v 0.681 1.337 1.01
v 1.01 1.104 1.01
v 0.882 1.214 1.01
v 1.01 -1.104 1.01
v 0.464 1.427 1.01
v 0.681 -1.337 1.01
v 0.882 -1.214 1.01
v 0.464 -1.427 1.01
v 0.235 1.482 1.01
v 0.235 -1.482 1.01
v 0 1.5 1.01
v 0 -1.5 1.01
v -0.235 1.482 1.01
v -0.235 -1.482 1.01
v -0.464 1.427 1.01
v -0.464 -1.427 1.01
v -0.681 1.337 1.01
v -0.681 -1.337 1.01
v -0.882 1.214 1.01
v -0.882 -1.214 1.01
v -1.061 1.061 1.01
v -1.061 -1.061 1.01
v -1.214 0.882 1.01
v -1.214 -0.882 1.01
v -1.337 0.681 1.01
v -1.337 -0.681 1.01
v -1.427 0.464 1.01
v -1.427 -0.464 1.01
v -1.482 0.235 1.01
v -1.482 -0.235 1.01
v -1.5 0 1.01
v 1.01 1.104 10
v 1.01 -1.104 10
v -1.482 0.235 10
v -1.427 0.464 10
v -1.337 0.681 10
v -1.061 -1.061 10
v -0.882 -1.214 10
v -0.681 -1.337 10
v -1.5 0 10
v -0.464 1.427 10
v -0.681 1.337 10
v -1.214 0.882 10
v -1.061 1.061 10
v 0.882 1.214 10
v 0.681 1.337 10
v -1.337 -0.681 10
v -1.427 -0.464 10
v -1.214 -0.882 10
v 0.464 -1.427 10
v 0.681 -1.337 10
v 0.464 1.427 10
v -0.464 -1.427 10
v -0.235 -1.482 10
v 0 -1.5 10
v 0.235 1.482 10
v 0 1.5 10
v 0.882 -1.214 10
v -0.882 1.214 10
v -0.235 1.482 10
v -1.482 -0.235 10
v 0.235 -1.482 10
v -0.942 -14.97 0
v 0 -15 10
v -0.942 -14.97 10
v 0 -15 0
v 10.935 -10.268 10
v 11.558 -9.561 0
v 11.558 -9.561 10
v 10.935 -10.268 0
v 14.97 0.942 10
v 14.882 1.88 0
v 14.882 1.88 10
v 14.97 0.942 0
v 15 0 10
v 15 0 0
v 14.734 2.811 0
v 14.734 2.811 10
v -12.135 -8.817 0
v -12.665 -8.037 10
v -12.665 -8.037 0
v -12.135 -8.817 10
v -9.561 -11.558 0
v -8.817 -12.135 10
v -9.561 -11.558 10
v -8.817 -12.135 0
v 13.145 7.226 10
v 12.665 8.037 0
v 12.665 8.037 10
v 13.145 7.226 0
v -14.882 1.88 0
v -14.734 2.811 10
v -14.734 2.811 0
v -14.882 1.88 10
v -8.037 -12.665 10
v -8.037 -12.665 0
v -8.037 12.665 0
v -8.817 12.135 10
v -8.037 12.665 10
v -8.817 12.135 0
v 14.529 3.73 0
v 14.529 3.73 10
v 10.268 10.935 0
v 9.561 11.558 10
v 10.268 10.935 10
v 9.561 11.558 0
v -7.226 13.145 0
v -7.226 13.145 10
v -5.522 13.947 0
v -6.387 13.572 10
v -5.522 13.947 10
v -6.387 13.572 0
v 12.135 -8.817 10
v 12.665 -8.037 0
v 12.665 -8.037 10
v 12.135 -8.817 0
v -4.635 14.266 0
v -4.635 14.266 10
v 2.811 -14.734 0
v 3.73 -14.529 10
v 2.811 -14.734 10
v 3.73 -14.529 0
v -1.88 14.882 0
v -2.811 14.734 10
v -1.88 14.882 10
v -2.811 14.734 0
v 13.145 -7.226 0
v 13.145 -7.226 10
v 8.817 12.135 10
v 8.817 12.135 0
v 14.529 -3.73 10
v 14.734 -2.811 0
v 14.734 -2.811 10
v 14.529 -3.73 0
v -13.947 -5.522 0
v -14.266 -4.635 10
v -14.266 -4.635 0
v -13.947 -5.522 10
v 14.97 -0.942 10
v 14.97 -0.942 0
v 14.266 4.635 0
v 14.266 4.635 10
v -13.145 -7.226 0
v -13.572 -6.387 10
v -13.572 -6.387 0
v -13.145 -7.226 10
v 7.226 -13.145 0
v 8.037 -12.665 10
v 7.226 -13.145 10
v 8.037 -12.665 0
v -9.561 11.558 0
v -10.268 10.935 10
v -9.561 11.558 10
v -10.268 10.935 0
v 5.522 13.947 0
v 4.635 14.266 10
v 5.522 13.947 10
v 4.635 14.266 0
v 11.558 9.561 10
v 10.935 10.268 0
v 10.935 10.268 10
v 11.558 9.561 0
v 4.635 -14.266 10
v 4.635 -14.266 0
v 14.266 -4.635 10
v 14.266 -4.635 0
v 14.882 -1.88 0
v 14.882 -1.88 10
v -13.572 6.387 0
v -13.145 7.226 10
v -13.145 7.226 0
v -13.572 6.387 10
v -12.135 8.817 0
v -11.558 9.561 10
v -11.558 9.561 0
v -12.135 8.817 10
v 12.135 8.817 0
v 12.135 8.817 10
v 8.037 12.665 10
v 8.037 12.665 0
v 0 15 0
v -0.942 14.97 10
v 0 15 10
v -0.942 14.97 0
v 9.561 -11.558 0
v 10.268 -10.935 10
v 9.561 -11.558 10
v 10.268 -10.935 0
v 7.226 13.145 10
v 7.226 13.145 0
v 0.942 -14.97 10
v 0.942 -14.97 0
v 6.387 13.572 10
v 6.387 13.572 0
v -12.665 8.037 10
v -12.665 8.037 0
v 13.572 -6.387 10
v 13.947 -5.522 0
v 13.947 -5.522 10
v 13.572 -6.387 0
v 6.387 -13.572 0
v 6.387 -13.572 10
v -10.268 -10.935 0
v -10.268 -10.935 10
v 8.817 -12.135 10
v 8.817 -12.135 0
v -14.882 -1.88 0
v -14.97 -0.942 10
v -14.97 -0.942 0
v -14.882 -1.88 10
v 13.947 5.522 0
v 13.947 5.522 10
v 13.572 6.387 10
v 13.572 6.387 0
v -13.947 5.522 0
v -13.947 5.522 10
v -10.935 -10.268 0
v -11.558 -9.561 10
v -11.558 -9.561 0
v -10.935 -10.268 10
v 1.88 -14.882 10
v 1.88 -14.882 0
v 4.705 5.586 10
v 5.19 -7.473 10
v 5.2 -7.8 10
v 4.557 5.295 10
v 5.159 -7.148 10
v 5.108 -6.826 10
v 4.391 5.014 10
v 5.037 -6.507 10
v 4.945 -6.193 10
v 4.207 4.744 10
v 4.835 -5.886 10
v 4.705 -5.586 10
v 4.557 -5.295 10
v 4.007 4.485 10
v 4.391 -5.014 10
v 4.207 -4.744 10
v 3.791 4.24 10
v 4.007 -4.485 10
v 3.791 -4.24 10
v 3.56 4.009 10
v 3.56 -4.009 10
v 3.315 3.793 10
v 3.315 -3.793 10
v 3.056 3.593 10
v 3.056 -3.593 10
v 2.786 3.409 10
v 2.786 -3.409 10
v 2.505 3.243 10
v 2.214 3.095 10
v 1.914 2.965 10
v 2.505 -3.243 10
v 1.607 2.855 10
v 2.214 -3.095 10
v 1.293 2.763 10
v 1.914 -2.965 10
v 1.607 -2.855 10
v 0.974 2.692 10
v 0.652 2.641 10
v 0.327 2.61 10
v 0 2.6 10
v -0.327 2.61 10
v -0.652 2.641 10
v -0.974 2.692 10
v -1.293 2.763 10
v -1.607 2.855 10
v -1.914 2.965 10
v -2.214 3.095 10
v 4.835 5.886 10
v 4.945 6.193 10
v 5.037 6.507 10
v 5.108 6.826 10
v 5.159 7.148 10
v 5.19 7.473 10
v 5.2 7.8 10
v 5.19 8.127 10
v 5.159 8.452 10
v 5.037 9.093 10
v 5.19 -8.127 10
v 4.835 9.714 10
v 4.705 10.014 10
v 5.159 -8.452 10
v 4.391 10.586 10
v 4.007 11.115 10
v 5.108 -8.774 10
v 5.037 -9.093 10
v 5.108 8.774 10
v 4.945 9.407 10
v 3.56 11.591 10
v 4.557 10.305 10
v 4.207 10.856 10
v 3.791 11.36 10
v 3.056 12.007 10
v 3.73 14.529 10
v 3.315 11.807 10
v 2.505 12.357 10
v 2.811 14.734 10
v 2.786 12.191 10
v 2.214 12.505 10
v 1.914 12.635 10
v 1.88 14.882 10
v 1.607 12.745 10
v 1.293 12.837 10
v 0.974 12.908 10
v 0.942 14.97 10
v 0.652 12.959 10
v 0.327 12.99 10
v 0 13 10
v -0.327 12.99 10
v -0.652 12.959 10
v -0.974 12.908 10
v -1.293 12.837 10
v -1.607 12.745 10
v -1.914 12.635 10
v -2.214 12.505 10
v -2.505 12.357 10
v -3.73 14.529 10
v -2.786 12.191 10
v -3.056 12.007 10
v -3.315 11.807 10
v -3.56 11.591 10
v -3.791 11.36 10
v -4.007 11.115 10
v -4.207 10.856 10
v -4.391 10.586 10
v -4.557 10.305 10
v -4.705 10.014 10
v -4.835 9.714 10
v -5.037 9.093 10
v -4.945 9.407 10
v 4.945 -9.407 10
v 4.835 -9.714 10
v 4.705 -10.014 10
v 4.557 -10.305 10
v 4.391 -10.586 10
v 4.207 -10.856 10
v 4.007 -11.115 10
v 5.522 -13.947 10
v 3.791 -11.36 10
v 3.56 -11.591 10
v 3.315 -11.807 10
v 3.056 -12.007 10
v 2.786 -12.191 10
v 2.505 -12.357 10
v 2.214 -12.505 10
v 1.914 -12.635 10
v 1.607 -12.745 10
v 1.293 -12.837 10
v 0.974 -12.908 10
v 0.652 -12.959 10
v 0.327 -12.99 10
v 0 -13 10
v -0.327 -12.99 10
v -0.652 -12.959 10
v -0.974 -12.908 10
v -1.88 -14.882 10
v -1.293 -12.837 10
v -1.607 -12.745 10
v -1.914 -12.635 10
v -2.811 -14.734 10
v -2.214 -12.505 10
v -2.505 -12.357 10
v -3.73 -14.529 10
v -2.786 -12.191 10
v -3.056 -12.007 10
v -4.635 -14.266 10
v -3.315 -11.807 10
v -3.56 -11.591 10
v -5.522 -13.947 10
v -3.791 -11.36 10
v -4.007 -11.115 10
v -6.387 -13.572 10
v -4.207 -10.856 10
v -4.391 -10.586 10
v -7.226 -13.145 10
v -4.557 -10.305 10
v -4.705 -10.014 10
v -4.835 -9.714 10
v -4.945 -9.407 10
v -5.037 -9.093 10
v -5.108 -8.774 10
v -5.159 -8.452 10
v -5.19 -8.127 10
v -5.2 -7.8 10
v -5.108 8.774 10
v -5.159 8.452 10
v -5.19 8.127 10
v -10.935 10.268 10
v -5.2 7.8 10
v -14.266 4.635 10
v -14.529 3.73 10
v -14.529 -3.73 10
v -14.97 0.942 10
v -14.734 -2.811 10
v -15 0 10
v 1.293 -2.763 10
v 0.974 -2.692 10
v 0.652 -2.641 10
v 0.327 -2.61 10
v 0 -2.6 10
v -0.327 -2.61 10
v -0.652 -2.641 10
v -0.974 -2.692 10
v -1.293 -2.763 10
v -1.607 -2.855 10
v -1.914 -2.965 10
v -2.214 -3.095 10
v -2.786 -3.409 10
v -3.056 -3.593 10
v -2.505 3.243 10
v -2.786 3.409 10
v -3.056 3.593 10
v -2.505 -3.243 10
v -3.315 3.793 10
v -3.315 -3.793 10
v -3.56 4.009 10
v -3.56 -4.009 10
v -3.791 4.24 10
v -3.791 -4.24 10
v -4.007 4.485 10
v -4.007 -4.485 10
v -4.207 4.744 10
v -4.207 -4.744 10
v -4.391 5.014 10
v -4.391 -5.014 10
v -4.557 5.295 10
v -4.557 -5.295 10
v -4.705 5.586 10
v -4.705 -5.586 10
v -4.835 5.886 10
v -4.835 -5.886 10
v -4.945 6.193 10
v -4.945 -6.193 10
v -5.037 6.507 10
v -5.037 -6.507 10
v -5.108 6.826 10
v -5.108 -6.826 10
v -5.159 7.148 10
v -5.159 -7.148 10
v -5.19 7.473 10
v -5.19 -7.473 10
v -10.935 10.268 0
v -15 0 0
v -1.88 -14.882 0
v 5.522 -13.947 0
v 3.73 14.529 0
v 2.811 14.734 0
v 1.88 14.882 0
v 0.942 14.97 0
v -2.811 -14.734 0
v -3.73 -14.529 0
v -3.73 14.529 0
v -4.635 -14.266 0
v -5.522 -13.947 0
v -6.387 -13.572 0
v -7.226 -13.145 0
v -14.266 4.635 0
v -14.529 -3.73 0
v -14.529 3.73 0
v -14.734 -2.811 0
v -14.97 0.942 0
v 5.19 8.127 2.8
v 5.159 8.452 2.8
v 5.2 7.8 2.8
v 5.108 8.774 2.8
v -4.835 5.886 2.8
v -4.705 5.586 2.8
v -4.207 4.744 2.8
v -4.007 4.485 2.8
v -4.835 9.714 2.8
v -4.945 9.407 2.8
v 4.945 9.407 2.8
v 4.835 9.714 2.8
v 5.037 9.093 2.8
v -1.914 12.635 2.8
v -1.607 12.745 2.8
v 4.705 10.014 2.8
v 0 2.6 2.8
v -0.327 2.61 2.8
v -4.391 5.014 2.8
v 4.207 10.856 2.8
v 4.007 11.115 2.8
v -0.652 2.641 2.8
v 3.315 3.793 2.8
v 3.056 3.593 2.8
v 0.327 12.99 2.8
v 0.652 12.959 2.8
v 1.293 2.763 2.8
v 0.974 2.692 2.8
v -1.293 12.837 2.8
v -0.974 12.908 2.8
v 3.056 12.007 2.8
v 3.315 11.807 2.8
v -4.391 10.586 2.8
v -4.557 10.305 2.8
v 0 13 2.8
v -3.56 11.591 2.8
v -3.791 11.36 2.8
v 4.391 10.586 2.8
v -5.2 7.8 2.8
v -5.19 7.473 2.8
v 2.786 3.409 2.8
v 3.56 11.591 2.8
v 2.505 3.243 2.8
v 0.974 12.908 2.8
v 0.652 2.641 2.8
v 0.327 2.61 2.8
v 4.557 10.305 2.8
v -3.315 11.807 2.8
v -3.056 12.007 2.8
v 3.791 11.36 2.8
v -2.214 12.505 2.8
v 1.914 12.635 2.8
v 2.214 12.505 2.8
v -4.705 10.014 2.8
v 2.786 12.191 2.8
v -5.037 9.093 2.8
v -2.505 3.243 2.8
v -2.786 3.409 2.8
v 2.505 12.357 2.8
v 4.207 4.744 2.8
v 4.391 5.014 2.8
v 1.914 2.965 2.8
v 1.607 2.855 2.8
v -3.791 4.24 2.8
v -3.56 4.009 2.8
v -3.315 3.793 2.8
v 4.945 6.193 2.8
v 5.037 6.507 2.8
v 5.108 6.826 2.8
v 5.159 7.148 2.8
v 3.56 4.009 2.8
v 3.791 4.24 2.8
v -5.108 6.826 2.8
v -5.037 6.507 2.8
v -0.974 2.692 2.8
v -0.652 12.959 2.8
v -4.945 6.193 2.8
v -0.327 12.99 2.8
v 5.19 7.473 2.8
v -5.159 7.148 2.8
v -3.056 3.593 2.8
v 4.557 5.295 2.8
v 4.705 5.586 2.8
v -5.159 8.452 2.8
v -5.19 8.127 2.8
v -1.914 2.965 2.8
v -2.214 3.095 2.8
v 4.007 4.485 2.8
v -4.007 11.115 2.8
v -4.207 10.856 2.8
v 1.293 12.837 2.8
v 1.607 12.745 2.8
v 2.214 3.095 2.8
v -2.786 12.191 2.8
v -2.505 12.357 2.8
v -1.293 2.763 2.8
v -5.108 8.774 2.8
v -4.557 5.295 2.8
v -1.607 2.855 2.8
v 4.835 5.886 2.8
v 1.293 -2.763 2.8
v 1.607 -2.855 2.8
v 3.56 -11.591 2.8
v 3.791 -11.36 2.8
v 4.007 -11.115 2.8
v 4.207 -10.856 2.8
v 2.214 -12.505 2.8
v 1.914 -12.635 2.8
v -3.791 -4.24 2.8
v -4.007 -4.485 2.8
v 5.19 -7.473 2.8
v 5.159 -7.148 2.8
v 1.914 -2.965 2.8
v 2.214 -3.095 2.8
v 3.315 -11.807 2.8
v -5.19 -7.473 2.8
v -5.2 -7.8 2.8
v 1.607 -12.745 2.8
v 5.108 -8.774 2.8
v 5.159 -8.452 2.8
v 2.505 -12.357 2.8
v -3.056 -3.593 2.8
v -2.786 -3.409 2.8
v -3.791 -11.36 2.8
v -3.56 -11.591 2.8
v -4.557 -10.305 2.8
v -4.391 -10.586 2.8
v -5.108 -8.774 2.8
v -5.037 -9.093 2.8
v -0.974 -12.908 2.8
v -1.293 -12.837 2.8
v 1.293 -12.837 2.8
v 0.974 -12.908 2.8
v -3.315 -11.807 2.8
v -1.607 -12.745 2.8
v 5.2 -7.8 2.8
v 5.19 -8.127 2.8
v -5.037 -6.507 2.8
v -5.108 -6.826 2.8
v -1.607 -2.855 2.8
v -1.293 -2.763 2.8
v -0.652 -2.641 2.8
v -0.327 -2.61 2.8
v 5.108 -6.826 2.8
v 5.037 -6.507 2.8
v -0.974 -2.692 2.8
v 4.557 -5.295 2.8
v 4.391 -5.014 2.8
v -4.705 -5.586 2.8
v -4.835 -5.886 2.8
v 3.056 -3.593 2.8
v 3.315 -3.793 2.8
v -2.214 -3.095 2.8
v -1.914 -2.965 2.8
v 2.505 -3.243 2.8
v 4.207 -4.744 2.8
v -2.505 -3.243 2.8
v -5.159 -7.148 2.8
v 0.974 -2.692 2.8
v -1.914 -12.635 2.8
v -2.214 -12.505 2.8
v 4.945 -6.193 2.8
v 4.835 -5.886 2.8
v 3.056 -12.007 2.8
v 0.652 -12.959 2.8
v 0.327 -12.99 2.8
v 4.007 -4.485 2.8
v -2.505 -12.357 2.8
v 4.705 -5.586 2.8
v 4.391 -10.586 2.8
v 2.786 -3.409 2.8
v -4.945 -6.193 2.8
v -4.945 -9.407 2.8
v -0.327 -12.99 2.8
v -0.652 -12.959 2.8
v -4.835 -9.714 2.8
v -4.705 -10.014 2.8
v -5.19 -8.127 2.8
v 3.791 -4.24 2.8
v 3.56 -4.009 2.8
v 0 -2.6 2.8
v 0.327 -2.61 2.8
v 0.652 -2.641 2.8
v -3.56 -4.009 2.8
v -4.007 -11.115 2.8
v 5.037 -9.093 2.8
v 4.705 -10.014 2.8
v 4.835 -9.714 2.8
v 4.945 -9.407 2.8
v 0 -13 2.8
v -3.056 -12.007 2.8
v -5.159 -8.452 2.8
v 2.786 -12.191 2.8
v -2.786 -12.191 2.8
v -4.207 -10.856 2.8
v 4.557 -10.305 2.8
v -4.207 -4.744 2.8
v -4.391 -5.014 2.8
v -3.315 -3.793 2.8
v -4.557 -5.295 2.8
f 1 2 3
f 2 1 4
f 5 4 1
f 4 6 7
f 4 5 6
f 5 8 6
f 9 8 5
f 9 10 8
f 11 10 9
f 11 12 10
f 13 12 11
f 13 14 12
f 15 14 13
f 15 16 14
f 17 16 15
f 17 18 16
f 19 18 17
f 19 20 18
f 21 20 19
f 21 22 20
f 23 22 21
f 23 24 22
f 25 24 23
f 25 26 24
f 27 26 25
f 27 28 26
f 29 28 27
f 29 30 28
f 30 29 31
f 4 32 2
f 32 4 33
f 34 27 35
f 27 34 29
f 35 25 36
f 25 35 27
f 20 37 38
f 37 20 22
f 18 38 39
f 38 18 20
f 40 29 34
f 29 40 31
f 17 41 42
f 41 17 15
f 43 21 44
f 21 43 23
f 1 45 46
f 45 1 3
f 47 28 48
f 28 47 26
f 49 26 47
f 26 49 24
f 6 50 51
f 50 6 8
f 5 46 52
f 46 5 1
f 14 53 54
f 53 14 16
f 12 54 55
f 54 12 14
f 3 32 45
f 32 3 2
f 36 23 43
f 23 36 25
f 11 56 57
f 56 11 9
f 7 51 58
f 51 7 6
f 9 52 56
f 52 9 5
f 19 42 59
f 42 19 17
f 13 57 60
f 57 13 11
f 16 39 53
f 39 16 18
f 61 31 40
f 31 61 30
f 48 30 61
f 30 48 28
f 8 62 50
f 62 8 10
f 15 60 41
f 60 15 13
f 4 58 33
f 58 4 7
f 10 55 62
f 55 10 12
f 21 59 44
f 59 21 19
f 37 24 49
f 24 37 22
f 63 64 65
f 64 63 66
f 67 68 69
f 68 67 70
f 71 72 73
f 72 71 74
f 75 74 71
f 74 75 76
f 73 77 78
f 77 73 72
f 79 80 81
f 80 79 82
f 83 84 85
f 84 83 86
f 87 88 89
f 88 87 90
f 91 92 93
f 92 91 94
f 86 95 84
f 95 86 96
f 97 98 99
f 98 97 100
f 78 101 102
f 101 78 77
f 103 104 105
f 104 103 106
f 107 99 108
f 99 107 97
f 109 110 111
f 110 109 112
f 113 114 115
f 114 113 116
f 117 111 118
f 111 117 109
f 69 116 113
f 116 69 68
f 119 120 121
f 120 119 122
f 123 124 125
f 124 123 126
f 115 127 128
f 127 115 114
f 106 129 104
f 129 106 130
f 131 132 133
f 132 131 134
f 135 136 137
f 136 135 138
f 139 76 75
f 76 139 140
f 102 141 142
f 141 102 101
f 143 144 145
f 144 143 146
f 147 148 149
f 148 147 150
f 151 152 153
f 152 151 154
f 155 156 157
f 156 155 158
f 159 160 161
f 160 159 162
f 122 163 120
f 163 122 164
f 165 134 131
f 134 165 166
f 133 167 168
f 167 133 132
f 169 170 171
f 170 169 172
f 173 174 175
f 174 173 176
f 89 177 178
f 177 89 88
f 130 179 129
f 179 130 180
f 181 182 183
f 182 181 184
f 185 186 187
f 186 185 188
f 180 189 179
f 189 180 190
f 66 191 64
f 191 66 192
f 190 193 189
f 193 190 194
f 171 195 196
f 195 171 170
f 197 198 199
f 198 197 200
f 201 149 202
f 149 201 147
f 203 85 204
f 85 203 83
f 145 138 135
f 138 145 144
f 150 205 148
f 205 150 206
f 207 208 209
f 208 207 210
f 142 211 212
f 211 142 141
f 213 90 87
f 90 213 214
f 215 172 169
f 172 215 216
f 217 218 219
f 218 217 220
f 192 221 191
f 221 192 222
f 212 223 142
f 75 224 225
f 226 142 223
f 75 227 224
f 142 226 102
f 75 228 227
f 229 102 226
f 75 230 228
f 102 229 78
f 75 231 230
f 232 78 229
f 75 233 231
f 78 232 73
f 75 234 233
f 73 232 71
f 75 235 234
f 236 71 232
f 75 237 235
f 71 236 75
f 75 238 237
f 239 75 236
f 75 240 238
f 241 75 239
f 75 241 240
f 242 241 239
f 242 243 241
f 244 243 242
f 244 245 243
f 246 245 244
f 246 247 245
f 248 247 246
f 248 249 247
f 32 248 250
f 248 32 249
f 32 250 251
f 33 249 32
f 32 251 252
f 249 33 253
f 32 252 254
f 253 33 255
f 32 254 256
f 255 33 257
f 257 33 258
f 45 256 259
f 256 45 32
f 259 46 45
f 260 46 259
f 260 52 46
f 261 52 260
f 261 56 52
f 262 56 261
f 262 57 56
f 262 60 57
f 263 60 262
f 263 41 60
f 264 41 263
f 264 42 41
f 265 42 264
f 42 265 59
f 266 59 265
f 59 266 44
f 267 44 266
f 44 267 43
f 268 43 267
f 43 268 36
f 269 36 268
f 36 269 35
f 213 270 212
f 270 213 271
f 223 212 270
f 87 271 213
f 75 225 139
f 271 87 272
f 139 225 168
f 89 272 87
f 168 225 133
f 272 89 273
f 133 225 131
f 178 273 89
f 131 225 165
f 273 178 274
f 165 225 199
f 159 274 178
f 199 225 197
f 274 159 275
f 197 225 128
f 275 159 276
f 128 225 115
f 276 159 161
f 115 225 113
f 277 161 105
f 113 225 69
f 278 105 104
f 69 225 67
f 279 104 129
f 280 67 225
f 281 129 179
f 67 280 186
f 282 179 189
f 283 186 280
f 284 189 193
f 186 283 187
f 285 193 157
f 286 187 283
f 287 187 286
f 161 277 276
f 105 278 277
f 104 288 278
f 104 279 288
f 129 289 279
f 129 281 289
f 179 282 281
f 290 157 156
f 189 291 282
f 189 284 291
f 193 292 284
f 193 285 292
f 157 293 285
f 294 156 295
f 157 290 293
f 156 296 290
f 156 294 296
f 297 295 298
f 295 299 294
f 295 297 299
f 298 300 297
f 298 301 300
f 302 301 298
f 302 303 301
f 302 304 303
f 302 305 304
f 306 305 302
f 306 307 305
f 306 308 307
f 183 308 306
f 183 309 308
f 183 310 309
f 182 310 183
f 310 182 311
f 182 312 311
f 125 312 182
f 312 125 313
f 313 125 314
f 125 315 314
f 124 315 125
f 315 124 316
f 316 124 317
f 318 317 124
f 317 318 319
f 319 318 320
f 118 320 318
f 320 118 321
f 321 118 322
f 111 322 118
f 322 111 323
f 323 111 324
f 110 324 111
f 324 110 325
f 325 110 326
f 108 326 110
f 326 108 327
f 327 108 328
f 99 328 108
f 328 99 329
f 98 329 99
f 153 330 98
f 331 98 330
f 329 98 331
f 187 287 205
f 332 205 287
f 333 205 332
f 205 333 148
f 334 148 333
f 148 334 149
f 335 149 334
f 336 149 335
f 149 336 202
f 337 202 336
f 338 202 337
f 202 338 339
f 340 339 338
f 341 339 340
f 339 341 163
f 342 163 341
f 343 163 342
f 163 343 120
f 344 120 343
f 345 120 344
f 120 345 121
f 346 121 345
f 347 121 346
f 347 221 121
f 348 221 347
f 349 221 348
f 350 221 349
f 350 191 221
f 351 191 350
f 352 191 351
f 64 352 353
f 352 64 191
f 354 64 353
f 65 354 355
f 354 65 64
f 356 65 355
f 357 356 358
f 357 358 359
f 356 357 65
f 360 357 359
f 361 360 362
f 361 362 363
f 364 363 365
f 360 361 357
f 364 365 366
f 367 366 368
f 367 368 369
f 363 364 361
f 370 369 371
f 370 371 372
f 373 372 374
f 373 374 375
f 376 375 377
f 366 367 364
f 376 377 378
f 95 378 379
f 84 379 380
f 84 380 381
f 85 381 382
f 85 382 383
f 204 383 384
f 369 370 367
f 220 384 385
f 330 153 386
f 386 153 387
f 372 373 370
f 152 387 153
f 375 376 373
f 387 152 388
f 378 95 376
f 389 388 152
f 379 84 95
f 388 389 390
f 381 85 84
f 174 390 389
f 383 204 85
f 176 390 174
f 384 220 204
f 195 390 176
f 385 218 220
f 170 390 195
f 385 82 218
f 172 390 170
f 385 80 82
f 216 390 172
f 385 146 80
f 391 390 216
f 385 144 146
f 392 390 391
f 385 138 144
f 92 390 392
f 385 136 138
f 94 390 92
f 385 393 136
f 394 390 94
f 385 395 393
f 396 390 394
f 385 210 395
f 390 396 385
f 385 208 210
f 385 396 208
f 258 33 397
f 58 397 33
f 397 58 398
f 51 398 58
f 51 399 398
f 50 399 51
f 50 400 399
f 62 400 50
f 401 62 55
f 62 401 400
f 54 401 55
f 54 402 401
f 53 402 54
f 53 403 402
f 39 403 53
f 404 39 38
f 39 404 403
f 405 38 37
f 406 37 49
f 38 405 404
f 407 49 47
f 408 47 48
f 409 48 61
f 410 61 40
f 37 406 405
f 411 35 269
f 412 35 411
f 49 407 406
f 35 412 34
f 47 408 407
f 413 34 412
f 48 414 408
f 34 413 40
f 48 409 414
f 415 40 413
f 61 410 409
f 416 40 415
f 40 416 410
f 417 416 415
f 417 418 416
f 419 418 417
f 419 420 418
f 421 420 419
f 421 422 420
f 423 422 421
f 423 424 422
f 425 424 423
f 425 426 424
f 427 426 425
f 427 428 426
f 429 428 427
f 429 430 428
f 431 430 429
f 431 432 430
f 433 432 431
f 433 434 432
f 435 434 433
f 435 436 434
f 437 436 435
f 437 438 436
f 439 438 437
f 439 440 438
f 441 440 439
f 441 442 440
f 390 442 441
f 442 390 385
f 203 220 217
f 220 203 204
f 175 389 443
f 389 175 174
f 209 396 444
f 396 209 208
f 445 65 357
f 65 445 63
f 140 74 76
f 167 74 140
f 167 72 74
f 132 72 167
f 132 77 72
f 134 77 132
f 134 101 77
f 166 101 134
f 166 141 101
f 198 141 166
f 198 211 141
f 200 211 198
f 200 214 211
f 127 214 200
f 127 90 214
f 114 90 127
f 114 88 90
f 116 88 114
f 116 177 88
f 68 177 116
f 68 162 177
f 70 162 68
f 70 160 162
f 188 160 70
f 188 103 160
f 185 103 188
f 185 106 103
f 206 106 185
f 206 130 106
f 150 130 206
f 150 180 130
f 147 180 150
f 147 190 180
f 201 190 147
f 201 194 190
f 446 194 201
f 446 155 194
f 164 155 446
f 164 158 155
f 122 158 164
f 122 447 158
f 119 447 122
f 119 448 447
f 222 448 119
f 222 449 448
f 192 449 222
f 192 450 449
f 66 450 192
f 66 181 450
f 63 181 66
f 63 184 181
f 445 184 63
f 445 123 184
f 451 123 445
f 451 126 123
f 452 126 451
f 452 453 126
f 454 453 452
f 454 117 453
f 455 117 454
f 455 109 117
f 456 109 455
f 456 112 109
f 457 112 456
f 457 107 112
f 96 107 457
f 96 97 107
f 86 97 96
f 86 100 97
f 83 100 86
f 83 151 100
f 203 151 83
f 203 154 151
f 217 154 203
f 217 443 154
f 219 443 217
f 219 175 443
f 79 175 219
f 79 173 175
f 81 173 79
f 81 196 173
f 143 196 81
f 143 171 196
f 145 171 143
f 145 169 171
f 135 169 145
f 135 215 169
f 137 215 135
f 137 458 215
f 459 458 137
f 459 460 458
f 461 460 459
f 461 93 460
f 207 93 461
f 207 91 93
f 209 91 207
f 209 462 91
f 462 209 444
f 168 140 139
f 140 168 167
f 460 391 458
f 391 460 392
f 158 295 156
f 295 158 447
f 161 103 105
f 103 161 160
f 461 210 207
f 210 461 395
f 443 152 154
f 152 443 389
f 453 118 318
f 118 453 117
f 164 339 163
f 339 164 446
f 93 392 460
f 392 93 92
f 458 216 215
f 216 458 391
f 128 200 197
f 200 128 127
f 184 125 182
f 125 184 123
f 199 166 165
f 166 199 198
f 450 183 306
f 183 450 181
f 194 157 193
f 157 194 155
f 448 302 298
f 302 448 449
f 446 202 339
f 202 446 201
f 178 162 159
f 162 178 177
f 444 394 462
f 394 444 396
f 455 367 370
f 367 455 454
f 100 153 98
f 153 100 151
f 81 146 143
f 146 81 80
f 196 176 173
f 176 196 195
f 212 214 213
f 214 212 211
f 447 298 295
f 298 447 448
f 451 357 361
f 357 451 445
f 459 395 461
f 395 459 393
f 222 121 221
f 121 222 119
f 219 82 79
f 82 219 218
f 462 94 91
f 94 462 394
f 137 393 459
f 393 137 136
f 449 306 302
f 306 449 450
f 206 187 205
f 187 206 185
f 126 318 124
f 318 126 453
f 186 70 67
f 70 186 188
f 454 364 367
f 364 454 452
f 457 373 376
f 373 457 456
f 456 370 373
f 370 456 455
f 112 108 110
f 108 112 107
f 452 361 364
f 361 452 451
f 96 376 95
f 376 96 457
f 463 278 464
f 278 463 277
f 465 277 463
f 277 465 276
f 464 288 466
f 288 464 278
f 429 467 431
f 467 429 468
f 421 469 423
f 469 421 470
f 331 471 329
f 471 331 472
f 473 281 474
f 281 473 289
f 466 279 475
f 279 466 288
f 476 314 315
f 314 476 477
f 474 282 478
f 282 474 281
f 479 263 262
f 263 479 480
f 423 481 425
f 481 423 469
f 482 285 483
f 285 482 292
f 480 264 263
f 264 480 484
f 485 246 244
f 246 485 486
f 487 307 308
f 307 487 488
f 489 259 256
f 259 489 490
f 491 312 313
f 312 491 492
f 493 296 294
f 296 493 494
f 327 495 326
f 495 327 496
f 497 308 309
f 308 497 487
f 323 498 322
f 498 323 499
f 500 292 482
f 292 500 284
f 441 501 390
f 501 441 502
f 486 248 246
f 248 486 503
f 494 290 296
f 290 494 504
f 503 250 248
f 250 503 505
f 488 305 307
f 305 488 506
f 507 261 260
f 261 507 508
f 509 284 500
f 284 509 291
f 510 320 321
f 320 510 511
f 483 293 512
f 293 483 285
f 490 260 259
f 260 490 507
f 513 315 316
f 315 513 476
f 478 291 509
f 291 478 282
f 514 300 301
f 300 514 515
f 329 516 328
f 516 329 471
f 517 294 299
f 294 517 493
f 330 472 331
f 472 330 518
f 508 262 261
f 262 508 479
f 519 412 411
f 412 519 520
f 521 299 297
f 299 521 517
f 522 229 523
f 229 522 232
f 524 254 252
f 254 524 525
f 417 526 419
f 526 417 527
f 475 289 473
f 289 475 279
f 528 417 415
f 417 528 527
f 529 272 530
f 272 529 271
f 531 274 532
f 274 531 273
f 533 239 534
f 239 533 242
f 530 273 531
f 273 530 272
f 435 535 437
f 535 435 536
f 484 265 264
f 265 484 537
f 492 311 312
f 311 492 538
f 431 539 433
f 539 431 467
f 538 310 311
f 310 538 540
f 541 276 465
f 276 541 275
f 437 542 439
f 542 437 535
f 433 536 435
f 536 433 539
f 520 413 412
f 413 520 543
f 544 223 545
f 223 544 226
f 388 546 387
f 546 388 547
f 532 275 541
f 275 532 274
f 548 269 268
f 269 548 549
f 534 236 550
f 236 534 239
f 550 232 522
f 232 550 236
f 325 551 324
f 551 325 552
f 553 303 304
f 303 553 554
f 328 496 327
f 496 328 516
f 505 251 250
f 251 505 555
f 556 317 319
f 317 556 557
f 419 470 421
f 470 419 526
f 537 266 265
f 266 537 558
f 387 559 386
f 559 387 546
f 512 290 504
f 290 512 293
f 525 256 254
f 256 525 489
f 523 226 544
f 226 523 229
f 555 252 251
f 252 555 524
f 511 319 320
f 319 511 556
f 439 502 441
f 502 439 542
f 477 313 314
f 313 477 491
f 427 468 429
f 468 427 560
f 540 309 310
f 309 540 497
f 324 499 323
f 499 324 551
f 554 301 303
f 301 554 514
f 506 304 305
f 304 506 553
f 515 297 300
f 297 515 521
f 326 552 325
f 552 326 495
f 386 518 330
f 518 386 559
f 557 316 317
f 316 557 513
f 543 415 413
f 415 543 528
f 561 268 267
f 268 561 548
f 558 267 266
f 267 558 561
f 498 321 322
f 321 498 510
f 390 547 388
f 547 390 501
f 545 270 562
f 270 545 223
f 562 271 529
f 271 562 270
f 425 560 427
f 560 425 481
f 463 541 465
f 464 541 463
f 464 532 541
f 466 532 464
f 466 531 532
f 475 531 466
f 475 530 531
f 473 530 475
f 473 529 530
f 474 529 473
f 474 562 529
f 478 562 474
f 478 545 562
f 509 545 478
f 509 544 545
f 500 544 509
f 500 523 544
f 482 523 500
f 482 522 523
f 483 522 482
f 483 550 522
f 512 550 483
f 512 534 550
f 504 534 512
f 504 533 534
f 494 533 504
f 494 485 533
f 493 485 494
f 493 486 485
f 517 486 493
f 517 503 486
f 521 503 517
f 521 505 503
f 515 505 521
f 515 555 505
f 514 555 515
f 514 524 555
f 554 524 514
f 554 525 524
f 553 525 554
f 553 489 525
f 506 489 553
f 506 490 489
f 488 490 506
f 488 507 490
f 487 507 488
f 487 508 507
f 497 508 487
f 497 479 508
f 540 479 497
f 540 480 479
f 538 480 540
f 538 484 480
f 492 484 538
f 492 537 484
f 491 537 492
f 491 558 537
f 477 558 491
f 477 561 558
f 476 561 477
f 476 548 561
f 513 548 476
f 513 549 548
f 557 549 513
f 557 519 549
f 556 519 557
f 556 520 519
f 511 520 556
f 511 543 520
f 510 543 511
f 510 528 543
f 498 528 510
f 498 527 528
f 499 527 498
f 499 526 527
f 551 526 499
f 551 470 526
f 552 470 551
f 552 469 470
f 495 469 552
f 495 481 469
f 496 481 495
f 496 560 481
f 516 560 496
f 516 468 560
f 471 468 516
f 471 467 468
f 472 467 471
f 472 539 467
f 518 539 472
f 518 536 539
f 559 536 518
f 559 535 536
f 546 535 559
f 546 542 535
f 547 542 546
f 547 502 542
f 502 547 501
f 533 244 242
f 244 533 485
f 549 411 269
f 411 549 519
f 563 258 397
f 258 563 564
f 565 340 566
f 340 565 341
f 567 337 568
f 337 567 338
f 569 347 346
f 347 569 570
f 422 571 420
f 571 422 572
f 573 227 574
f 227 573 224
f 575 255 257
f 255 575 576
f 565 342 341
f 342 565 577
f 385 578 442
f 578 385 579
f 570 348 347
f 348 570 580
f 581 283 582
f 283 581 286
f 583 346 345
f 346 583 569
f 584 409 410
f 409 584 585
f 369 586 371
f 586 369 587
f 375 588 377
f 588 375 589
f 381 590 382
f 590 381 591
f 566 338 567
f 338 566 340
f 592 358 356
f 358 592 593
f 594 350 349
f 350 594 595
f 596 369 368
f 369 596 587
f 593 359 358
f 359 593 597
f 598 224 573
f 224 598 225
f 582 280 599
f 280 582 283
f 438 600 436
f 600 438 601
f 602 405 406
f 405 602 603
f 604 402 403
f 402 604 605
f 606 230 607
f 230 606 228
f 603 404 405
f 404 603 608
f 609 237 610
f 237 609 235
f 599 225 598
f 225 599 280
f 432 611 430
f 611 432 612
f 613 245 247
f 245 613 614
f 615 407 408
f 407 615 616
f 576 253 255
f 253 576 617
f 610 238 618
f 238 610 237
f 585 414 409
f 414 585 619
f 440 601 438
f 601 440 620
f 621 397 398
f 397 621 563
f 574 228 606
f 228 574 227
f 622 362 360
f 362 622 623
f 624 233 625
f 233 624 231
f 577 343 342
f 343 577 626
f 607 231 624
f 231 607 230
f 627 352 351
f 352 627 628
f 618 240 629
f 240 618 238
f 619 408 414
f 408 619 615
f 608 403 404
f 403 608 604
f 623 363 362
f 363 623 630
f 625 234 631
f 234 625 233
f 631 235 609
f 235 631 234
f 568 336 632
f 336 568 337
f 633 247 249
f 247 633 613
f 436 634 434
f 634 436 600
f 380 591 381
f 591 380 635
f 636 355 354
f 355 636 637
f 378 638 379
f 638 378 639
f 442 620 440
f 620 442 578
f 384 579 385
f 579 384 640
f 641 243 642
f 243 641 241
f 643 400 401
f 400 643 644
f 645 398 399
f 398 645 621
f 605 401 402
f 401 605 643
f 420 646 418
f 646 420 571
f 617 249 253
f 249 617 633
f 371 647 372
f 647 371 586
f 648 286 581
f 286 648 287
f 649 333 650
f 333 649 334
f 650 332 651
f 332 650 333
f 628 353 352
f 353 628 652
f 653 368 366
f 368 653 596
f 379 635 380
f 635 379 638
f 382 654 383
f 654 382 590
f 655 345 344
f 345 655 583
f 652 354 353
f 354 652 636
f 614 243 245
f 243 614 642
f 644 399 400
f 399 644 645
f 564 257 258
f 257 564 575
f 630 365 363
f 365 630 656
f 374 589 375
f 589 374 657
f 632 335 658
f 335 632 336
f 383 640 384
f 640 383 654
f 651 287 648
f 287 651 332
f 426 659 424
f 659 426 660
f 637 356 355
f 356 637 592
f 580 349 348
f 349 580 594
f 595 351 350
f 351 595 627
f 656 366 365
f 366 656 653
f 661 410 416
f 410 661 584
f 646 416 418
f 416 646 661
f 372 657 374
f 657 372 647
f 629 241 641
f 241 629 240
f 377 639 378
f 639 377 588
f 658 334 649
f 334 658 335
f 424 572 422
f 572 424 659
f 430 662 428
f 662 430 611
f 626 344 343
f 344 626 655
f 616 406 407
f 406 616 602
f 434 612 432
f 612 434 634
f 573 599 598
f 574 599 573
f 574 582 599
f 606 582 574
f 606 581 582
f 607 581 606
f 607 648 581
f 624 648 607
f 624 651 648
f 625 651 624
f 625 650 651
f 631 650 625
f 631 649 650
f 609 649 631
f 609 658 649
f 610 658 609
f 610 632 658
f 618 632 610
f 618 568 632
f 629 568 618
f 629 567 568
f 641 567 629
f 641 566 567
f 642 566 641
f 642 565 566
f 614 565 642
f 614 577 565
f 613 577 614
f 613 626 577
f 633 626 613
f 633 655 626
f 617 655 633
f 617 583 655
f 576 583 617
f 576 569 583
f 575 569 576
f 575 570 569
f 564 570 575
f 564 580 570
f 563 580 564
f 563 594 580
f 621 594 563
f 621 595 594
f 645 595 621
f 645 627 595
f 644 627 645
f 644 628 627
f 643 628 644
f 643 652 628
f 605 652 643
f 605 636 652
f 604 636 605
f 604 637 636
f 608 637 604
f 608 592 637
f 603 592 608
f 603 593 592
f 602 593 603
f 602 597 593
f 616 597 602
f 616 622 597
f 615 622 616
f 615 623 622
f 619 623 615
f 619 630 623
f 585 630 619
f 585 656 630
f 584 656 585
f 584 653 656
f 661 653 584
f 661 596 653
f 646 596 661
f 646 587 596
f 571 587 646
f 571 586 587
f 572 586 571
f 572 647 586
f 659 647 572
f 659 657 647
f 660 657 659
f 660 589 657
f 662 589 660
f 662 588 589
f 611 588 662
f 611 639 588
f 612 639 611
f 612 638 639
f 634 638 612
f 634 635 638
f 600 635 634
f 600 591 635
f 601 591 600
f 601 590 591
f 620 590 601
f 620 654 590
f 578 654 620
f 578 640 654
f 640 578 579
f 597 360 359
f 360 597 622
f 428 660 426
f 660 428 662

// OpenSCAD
// file: motor.scad
//rotate([0,-90,0]){
//
	//motor(false);
//}
extraMotorSize =0.3;
N20MotorHeight = 10 + extraMotorSize;
N20MotorWidth = 12 + extraMotorSize;
N20MotorPartLenght = 15 + extraMotorSize;
N20GearPartLenght = 9 + extraMotorSize;
N20MotorLength = N20MotorPartLenght + N20GearPartLenght; 
N20MotorWireSpaceLen = 5;

//extraMotorSize = extra size when using as hole
//wireSpaceLenght = lenght of the space for wires behind motor
//placeForVires = if true there are place for wires... othervise not
//wallRemower =  parameter to remove thin walls if using as a hole 
//						set to zero if you want to print the motor
// centerAtAxis = if true, origo of motor will be where the axis exits the motor body.  Otherwise at the back of the motor.
// shaftCutout = cut space for shaft.  If false, will instead recreate the flat on the shaft.
// shaftSpacing = Spacing around shaft if it is cutout
module motor(placeForWires   = true, 
             wireSpaceLength = N20MotorWireSpaceLen, 
             wallRemover     = 0.1,
             centerAtAxis    = false,
             shaftCutout     = false, 
             shaftSpacing    = 0.5) {

    // Motor with these mesurments:
    // http://i1040.photobucket.com/albums/b403/guokunli/T2Q1irXhxaXXXXXXXX_649914550_conew1.jpg

     
    // width of motor
    width = N20MotorWidth;
    // height of motor
    height = N20MotorHeight;
    // lenght of the motor part
    motorLenght = N20MotorPartLenght;
    // lenght of the gear part
    gearLenght = N20GearPartLenght;
    // tickness and radius of the root of the shaft
    shaftRoot = 1;
    shaftRootR = 2;
    // lenght height and widt of the shaft
    shaftLenght = 10;
    shaftHeight = 2.5;
    shaftWidth = 3;

    



    // $fn value for cylinders
    fn = 40;

    epsilon = 0.01;

    // some calvculated parameters for easier use
    radiusW = width/2;
    radiusH = height/2;
    motorWhitoutShaftL = motorLenght+gearLenght+shaftRoot;

    // Allow centering at exit shaft position
    xOffs = centerAtAxis ? -motorWhitoutShaftL : 0;
    yOffs = 0;
    zOffs = centerAtAxis ? 0 : 0;
    translate([xOffs, yOffs, zOffs]) {
        if (placeForWires){
	        //place for wires
	        translate([-wireSpaceLength,-radiusW,-radiusW]){
		        cube([wireSpaceLength+epsilon, width, width]);
	        }
        }
         
        // motor part

        intersection(){
	        rotate([90,0,90])translate([0,0, -wallRemover]){
		        cylinder(motorLenght+2*wallRemover,radiusW, radiusW, $fn = fn);
	        }
	        translate([-wallRemover, -radiusW, -radiusH]){	
		        cube([motorLenght+2*wallRemover, width, height]);
	        }
        }

        //gear part

        translate([motorLenght-epsilon,-radiusW,-radiusH]){
	        cube([gearLenght+epsilon, width, height]);
           translate([gearLenght, radiusW, radiusH])rotate([0,90,0]){
		        cylinder(shaftRoot+epsilon, shaftRootR, shaftRootR, $fn = fn);
	        }   

        }

        // shaft

        translate([motorWhitoutShaftL - epsilon, 0, 0]){
            if (shaftCutout)  {
	            rotate([0,90,0]){
		            cylinder(shaftLenght + epsilon, r = shaftWidth/2 + shaftSpacing, $fn = fn);
	            }
            }
            else {
	            intersection(){
		            translate([0, -shaftWidth/2, -shaftWidth/2]){
			            cube([shaftLenght, shaftWidth, shaftHeight + epsilon]);
		            }
		            rotate([0,90,0]){
			            cylinder(shaftLenght + epsilon, r = shaftWidth/2, $fn = fn);
		            }
	            }
            }
        }
    }

}
// main file
include<motor.scad>

foot();

module foot(footDia = 30, footH = 10) {

	epsilon = 0.01;
	extrasize = 0.2;
	batteryR = 5 + extrasize;
	batteryHoleH = 7 + extrasize;
	footR = footDia/2;
	$fn = 100;
	

	difference(){
		cylinder(r = footR , footH );
		translate([0,1.5*batteryR,footH-batteryHoleH]) { 
				cylinder(r = batteryR , batteryHoleH+ epsilon );
		}
		translate([0,-1.5*batteryR,footH-batteryHoleH]) { 
				cylinder(r = batteryR , batteryHoleH+ epsilon );
		}	
		
		translate([0,0,footH+1])
    		rotate([0,90,0])
	    	    motor(centerAtAxis=true);
		
	}
}
